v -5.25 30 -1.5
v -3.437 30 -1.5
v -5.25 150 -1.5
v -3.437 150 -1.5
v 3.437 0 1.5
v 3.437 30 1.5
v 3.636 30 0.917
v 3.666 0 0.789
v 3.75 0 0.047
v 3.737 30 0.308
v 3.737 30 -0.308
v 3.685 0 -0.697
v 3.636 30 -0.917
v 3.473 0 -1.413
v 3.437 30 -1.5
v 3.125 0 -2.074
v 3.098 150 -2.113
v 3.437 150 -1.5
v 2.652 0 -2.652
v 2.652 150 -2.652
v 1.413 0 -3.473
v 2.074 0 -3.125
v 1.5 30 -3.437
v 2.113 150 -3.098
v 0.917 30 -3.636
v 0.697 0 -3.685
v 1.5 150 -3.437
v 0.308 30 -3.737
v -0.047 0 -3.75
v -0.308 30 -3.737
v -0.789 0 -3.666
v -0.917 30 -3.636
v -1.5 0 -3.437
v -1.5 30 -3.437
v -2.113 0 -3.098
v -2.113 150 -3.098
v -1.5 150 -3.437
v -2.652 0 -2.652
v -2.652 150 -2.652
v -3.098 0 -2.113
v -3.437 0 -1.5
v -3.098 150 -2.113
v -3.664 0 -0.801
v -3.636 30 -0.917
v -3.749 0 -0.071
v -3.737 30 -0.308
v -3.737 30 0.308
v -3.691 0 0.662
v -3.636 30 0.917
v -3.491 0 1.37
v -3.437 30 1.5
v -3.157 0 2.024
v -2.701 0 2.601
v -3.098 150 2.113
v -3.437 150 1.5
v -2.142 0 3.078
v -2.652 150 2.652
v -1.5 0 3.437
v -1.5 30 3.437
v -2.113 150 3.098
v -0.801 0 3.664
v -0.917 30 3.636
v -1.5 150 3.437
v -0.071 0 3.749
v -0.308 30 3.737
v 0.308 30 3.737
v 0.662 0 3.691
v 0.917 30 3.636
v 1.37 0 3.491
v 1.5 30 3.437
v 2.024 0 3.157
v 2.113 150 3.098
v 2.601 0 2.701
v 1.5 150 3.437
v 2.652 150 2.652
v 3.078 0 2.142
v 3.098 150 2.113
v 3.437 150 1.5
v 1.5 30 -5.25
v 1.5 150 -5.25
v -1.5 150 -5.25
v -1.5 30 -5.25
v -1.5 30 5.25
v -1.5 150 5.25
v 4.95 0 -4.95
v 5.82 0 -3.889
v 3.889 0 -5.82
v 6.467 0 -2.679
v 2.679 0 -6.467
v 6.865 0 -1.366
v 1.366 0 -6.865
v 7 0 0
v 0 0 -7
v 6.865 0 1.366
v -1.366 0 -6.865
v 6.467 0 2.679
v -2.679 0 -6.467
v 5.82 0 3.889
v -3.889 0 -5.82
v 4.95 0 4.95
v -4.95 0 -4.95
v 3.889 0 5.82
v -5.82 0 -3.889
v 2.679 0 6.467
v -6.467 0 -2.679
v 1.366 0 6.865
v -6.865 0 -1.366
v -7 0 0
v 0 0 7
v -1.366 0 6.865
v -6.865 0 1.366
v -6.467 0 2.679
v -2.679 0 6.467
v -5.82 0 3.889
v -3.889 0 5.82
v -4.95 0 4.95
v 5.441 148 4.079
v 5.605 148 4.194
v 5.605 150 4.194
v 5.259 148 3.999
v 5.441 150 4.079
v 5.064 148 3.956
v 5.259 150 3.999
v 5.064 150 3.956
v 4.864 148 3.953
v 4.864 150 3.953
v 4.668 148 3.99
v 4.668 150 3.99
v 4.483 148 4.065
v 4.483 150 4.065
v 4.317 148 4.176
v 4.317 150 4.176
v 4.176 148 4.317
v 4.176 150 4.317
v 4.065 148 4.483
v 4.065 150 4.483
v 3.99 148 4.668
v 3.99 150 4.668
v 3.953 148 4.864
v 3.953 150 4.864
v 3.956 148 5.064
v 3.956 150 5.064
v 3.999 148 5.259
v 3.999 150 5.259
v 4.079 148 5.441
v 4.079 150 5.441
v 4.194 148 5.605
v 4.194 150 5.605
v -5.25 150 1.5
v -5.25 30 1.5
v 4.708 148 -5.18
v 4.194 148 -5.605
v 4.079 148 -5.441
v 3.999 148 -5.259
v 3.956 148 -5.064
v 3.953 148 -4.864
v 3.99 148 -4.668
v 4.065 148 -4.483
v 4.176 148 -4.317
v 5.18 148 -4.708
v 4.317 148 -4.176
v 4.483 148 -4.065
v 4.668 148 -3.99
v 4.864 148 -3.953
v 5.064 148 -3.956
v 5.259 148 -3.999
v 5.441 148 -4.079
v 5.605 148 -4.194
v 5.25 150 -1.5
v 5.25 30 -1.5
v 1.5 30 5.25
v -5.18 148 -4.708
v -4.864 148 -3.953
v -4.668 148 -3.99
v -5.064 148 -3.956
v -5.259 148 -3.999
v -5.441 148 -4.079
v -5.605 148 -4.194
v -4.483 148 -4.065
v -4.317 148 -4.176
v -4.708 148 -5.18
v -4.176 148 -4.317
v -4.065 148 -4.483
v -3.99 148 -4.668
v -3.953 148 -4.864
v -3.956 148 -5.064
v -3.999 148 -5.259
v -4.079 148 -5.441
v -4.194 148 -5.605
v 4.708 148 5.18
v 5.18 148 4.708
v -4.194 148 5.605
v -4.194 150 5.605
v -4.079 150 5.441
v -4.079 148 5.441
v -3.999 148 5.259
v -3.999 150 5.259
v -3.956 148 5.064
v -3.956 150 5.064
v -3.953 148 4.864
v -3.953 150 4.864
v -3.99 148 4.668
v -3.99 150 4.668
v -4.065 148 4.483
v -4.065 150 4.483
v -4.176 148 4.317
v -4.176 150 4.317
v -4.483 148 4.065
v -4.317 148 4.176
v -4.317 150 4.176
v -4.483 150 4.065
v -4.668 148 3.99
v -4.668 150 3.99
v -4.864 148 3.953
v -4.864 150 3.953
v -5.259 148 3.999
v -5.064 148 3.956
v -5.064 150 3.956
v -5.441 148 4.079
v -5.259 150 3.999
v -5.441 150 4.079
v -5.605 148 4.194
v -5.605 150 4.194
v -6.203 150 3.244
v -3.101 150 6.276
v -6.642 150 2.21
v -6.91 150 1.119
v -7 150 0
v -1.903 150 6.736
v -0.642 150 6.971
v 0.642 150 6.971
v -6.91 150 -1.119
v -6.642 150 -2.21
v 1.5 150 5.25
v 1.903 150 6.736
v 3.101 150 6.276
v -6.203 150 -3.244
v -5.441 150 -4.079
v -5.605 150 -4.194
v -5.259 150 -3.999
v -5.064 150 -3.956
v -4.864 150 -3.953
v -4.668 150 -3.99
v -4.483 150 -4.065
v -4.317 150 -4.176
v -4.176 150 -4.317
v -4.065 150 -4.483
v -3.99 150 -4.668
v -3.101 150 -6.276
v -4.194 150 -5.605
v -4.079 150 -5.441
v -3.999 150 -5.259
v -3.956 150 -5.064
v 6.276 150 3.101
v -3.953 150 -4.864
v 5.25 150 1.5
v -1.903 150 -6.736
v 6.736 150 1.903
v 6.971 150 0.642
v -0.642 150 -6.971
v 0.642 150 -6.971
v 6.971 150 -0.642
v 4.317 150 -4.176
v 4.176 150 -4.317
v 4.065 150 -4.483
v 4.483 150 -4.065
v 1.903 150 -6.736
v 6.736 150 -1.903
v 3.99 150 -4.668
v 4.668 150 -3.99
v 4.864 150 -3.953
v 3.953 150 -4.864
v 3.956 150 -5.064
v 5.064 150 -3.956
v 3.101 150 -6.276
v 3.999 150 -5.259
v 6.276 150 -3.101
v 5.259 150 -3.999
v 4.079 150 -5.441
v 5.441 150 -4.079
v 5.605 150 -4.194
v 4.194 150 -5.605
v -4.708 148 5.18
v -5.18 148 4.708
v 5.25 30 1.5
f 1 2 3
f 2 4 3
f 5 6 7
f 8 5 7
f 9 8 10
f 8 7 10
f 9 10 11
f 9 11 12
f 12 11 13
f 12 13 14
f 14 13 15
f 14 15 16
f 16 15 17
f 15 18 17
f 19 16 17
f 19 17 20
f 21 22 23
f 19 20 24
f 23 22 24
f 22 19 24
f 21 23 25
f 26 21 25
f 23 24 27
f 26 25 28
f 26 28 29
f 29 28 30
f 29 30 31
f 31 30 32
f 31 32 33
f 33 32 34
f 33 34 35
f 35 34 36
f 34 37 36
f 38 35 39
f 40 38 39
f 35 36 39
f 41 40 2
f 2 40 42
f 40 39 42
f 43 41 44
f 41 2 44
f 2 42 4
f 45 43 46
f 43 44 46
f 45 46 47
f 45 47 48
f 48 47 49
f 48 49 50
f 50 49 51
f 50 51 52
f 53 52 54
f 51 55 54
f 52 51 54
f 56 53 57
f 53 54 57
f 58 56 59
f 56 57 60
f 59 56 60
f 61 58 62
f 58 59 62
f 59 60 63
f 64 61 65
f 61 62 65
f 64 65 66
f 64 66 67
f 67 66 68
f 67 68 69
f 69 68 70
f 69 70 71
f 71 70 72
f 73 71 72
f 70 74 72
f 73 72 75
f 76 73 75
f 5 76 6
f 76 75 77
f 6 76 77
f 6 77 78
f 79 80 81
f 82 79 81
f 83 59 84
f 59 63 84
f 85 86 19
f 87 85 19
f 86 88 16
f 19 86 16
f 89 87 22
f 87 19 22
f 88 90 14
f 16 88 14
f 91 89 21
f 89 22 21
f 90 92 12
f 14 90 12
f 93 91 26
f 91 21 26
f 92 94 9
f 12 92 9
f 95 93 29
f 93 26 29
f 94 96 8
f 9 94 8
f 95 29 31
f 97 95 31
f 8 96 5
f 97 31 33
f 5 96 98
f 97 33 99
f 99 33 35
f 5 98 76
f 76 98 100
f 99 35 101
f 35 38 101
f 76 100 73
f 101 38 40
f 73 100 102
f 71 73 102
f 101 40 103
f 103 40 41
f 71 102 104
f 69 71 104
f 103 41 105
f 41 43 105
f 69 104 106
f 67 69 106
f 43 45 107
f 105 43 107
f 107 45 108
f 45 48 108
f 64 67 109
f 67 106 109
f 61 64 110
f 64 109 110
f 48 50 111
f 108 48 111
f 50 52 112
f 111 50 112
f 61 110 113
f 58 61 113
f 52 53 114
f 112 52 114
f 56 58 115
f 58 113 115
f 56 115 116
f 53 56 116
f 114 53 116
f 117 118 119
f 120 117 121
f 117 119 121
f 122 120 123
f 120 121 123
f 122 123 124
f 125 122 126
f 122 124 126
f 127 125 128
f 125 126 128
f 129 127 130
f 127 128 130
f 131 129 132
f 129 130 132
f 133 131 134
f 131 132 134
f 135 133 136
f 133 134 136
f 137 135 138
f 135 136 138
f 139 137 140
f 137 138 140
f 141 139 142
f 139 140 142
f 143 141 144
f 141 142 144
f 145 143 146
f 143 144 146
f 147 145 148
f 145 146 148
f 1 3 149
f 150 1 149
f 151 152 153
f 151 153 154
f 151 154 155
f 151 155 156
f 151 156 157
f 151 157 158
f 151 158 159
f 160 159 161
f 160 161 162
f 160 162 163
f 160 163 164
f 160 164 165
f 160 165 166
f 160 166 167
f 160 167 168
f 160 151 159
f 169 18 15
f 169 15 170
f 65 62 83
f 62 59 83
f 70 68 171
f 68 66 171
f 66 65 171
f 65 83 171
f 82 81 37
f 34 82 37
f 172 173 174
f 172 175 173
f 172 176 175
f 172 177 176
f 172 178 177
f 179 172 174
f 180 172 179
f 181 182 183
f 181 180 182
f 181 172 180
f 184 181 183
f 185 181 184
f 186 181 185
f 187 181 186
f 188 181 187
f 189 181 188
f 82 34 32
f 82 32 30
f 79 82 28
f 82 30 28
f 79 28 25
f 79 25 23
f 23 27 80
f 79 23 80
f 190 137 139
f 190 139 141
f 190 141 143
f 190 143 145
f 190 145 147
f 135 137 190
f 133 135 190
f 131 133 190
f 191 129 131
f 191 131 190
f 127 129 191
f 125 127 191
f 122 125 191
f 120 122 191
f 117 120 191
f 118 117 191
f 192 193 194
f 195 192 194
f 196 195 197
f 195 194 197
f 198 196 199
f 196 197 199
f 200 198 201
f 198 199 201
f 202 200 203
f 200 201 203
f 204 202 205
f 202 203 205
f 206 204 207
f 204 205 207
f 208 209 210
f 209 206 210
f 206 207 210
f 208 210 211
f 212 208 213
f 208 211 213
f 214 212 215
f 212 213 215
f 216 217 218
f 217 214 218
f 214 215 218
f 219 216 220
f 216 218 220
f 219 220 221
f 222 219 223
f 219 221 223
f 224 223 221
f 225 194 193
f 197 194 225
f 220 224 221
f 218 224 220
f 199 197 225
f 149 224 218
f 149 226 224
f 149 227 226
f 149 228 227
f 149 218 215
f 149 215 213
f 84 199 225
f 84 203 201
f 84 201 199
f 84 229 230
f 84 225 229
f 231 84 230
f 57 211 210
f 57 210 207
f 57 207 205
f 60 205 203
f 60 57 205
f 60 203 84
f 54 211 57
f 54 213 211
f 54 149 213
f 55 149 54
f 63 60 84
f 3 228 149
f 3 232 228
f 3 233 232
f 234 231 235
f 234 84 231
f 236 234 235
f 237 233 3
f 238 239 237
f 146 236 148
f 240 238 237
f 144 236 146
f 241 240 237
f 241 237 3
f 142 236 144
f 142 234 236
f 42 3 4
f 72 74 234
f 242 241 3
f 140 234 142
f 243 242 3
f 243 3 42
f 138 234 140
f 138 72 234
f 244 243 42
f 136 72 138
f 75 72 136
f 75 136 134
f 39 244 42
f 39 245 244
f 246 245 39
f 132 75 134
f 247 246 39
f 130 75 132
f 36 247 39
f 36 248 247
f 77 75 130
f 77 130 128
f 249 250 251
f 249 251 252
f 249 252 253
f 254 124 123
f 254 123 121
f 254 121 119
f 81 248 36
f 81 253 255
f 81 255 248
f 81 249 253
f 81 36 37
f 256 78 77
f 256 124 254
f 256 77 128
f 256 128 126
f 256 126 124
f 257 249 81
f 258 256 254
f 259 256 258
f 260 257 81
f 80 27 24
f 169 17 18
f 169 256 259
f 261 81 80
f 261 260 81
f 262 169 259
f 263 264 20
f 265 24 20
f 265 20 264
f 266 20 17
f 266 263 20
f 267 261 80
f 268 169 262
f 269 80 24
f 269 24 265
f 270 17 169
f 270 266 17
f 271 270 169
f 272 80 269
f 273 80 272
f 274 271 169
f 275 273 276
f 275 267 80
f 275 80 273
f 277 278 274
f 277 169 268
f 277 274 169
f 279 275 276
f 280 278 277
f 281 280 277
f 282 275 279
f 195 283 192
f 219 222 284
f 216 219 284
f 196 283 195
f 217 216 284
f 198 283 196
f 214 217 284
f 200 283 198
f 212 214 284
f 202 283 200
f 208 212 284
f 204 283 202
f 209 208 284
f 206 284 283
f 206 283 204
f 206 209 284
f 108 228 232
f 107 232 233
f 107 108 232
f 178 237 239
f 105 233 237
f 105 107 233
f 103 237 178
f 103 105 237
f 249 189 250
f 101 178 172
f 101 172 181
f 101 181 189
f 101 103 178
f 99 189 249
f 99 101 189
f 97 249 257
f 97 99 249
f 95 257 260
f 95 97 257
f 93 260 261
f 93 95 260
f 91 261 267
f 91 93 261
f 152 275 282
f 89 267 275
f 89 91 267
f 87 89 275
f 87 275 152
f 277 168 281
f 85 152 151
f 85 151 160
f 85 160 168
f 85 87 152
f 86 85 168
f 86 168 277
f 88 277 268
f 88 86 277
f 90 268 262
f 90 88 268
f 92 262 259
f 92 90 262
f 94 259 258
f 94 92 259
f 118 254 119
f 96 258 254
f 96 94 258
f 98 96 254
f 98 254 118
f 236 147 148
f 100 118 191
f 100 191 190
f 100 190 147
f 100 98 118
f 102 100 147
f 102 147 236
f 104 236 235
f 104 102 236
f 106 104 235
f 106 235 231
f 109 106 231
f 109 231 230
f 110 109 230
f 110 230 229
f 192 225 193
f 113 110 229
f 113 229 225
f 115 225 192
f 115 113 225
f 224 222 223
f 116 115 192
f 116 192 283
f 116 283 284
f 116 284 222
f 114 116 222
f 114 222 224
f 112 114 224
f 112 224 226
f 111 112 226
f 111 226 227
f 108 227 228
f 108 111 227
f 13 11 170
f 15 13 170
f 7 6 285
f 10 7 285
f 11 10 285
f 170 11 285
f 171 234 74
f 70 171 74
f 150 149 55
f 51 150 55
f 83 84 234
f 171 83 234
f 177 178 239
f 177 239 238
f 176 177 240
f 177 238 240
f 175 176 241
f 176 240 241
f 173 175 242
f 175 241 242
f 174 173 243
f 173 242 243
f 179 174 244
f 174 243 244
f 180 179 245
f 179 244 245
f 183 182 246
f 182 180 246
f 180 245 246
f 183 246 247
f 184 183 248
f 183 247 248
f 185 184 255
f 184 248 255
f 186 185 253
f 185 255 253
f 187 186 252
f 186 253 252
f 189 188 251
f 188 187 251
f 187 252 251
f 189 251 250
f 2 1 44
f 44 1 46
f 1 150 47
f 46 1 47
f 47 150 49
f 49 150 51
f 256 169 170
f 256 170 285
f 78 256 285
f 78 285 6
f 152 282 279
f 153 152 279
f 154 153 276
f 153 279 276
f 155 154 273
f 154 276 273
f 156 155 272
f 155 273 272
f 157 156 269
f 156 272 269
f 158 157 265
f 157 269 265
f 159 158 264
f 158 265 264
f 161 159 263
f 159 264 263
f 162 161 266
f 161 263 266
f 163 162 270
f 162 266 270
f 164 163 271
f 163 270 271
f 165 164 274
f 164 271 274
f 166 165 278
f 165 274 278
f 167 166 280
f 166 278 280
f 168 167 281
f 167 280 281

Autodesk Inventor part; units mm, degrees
ref_plane "YZ Plane" through (0, 0, 0) normal (1, 0, 0) x (0, 1, 0)
ref_plane "XZ Plane" through (0, 0, 0) normal (0, 1, 0) x (-1, 0, 0)
ref_plane "XY Plane" through (0, 0, 0) normal (0, 0, 1) x (1, 0, 0)
sketch "Sketch1" plane through (0, 0, 0) normal (0, 1, 0) x (-1, 0, 0)
  circle A0 centre (0, 0) radius 7
  dimension "d0" = 14
extrude "Extrusion1" add sketch "Sketch1" along normal blind 158
sketch "Sketch2" plane through (0, 158, 0) normal (0, 1, 0) x (1, 0, 0)
  circle A0 centre (0, 0) radius 3.75
  line L0 (-5.25, -1.5) -> (-2.25, -1.5)
  line L1 (-2.25, -1.5) -> (-2.25, 1.5)
  line L2 (-2.25, 1.5) -> (-5.25, 1.5)
  line L3 (-5.25, 1.5) -> (-5.25, -1.5)
  line L4 (-5.25, -1.5) -> (-2.25, 1.5) construction
  line L5 (-2.25, -1.5) -> (-5.25, 1.5) construction
  line L6 (-1.5, 2.25) -> (1.5, 2.25)
  line L7 (1.5, 2.25) -> (1.5, 5.25)
  line L8 (1.5, 5.25) -> (-1.5, 5.25)
  line L9 (-1.5, 5.25) -> (-1.5, 2.25)
  line L10 (-1.5, 2.25) -> (1.5, 5.25) construction
  line L11 (1.5, 2.25) -> (-1.5, 5.25) construction
  line L12 (2.25, 1.5) -> (5.25, 1.5)
  line L13 (5.25, 1.5) -> (5.25, -1.5)
  line L14 (5.25, -1.5) -> (2.25, -1.5)
  line L15 (2.25, -1.5) -> (2.25, 1.5)
  line L16 (2.25, 1.5) -> (5.25, -1.5) construction
  line L17 (5.25, 1.5) -> (2.25, -1.5) construction
  line L18 (-1.5, -5.25) -> (1.5, -5.25)
  line L19 (1.5, -5.25) -> (1.5, -2.25)
  line L20 (1.5, -2.25) -> (-1.5, -2.25)
  line L21 (-1.5, -2.25) -> (-1.5, -5.25)
  line L22 (-1.5, -5.25) -> (1.5, -2.25) construction
  line L23 (1.5, -5.25) -> (-1.5, -2.25) construction
  point P0 (-3.75, 0)
  point P1 (0, 3.75)
  point P2 (3.75, 0)
  point P3 (0, -3.75)
  point P4 (-3.4369, -1.5)
  point P5 (-1.5, -3.4369)
  point P6 (1.5, -3.4369)
  point P7 (3.4369, -1.5)
  point P8 (3.4369, 1.5)
  point P9 (1.5, 3.4369)
  point P10 (-1.5, 3.4369)
  point P11 (-3.4369, 1.5)
  dimension "d58" = 7.5
  dimension "d59" = 3
  dimension "d60" = 3
  dimension "d61" = 3
  dimension "d62" = 3
  dimension "d63" = 3
  dimension "d64" = 3
  dimension "d65" = 3
  dimension "d66" = 3
extrude "Extrusion2" cut sketch "Sketch2" against normal through all
sketch "Sketch3" plane through (0, 158, 0) normal (0, 1, 0) x (1, 0, 0)
  circle A0 centre (0, 0) radius 9
  line L0 (-0.258, -9) -> (-0.258, -9)
  line L1 (-0.258, -11) -> (-0.258, -11)
  line L2 (-0.5, -9.5) -> (0.5, -9.5)
  line L3 (0.5, -9.5) -> (0.5, -8.5)
  line L4 (0.5, -8.5) -> (-0.5, -8.5)
  line L5 (-0.5, -8.5) -> (-0.5, -9.5)
  line L6 (-0.5, -9.5) -> (0.5, -8.5) construction
  line L7 (0.5, -9.5) -> (-0.5, -8.5) construction
  line L8 (-0.5, 8.5) -> (0.5, 8.5)
  line L9 (0.5, 8.5) -> (0.5, 9.5)
  line L10 (0.5, 9.5) -> (-0.5, 9.5)
  line L11 (-0.5, 9.5) -> (-0.5, 8.5)
  line L12 (-0.5, 8.5) -> (0.5, 9.5) construction
  line L13 (0.5, 8.5) -> (-0.5, 9.5) construction
  point P0 (0.492, 8.9865)
  point P1 (-0.258, -8.9963)
  point P2 (0, -9)
  point P3 (0, 9)
  point P4 (0.5, -8.9861)
  point P5 (-0.5, -8.9861)
  point P6 (-0.5, 8.9861)
  point P7 (0.5, 8.9861)
  dimension "d15" = 18
  dimension "d19" = 9
  dimension "d36" = 1
  dimension "d37" = 1
  dimension "d38" = 1
  dimension "d39" = 1
extrude "Extrusion3" cut sketch "Sketch3" against normal blind 8
sketch "Sketch5" plane through (0, 0, 0) normal (0, -1, 0) x (1, 0, 0)
  line L0 (-1.25, 3.25) -> (-1.25, 1.25)
  line L1 (-1.25, 1.25) -> (-3.25, 1.25)
  line L2 (3.25, 1.25) -> (1.25, 1.25)
  line L3 (1.25, 1.25) -> (1.25, 3.25)
  line L4 (1.25, -3.25) -> (1.25, -1.25)
  line L5 (1.25, -1.25) -> (3.25, -1.25)
  line L6 (-3.25, -1.25) -> (-1.25, -1.25)
  line L7 (-1.25, -1.25) -> (-1.25, -3.25)
  circle A0 centre (0, 0) radius 3.75
  line L8 (-3.4369, -1.5) -> (-5.25, -1.5) projected
  line L9 (-2.25, 1.5) -> (-5.25, 1.5)
  line L10 (-5.25, 1.5) -> (-5.25, -1.5)
  line L11 (-5.25, -1.5) -> (-2.25, -1.5)
  line L12 (-2.25, -1.5) -> (-2.25, 1.5)
  line L13 (-2.25, 1.5) -> (-5.25, -1.5) construction
  line L14 (-5.25, 1.5) -> (-2.25, -1.5) construction
  line L15 (-1.5, -5.25) -> (-1.5, -3.4369) projected
  line L16 (1.5, -2.25) -> (-1.5, -2.25)
  line L17 (-1.5, -2.25) -> (-1.5, -5.25)
  line L18 (-1.5, -5.25) -> (1.5, -5.25)
  line L19 (1.5, -5.25) -> (1.5, -2.25)
  line L20 (1.5, -2.25) -> (-1.5, -5.25) construction
  line L21 (-1.5, -2.25) -> (1.5, -5.25) construction
  line L22 (1.5, 2.25) -> (-1.5, 2.25)
  line L23 (-1.5, 2.25) -> (-1.5, 5.25)
  line L24 (-1.5, 5.25) -> (1.5, 5.25)
  line L25 (1.5, 5.25) -> (1.5, 2.25)
  line L26 (1.5, 2.25) -> (-1.5, 5.25) construction
  line L27 (-1.5, 2.25) -> (1.5, 5.25) construction
  line L28 (5.25, 1.5) -> (5.25, -1.5) projected
  line L29 (2.25, 1.5) -> (5.25, 1.5)
  line L30 (5.25, 1.5) -> (5.25, -1.5)
  line L31 (5.25, -1.5) -> (2.25, -1.5)
  line L32 (2.25, -1.5) -> (2.25, 1.5)
  line L33 (2.25, 1.5) -> (5.25, -1.5) construction
  line L34 (5.25, 1.5) -> (2.25, -1.5) construction
  point P0 (-3.25, 3.25)
  point P1 (3.25, -3.25)
  point P2 (-3.75, 0)
  point P3 (0, -3.75)
  point P4 (0, 3.75)
  point P5 (3.75, 0)
  point P6 (3.4369, -1.5)
  point P7 (3.4369, 1.5)
  point P8 (-1.5, 3.4369)
  point P9 (1.5, 3.4369)
  point P10 (-3.4369, 1.5)
  point P11 (1.5, -3.4369)
  dimension "d54" = 360
extrude "Extrusion5" add sketch "Sketch5" against normal blind 30 contours L23 L24 L25 A0 | A0 L8 L10 L9 | L29 L28 L31 A0 | A0 L19 L18 L15
sketch "Sketch6" plane through (0, 150, 0) normal (0, 1, 0) x (1, 0, 0)
  circle A0 centre (0, 0) radius 7 projected
  line L0 (0, 0) -> (7, 0) construction
  circle A1 centre (-4.9497, 4.9497) radius 1
  circle A2 centre (-4.9497, -4.9497) radius 1
  circle A3 centre (4.9497, -4.9497) radius 1
  circle A4 centre (4.9497, 4.9497) radius 1
  dimension "d69" = 2
  dimension "d70" = 4.9497
  dimension "d71" = 4.9497
  dimension "d74" = 360
extrude "Extrusion6" cut sketch "Sketch6" against normal blind 2 contours A4 A0 | A0 A4 | A3 A0 | A0 A3 | A1 A0 | A0 A1 | A2 A0 | A0 A2
properties part number "Upper Arm" material "PLA Plastic"
